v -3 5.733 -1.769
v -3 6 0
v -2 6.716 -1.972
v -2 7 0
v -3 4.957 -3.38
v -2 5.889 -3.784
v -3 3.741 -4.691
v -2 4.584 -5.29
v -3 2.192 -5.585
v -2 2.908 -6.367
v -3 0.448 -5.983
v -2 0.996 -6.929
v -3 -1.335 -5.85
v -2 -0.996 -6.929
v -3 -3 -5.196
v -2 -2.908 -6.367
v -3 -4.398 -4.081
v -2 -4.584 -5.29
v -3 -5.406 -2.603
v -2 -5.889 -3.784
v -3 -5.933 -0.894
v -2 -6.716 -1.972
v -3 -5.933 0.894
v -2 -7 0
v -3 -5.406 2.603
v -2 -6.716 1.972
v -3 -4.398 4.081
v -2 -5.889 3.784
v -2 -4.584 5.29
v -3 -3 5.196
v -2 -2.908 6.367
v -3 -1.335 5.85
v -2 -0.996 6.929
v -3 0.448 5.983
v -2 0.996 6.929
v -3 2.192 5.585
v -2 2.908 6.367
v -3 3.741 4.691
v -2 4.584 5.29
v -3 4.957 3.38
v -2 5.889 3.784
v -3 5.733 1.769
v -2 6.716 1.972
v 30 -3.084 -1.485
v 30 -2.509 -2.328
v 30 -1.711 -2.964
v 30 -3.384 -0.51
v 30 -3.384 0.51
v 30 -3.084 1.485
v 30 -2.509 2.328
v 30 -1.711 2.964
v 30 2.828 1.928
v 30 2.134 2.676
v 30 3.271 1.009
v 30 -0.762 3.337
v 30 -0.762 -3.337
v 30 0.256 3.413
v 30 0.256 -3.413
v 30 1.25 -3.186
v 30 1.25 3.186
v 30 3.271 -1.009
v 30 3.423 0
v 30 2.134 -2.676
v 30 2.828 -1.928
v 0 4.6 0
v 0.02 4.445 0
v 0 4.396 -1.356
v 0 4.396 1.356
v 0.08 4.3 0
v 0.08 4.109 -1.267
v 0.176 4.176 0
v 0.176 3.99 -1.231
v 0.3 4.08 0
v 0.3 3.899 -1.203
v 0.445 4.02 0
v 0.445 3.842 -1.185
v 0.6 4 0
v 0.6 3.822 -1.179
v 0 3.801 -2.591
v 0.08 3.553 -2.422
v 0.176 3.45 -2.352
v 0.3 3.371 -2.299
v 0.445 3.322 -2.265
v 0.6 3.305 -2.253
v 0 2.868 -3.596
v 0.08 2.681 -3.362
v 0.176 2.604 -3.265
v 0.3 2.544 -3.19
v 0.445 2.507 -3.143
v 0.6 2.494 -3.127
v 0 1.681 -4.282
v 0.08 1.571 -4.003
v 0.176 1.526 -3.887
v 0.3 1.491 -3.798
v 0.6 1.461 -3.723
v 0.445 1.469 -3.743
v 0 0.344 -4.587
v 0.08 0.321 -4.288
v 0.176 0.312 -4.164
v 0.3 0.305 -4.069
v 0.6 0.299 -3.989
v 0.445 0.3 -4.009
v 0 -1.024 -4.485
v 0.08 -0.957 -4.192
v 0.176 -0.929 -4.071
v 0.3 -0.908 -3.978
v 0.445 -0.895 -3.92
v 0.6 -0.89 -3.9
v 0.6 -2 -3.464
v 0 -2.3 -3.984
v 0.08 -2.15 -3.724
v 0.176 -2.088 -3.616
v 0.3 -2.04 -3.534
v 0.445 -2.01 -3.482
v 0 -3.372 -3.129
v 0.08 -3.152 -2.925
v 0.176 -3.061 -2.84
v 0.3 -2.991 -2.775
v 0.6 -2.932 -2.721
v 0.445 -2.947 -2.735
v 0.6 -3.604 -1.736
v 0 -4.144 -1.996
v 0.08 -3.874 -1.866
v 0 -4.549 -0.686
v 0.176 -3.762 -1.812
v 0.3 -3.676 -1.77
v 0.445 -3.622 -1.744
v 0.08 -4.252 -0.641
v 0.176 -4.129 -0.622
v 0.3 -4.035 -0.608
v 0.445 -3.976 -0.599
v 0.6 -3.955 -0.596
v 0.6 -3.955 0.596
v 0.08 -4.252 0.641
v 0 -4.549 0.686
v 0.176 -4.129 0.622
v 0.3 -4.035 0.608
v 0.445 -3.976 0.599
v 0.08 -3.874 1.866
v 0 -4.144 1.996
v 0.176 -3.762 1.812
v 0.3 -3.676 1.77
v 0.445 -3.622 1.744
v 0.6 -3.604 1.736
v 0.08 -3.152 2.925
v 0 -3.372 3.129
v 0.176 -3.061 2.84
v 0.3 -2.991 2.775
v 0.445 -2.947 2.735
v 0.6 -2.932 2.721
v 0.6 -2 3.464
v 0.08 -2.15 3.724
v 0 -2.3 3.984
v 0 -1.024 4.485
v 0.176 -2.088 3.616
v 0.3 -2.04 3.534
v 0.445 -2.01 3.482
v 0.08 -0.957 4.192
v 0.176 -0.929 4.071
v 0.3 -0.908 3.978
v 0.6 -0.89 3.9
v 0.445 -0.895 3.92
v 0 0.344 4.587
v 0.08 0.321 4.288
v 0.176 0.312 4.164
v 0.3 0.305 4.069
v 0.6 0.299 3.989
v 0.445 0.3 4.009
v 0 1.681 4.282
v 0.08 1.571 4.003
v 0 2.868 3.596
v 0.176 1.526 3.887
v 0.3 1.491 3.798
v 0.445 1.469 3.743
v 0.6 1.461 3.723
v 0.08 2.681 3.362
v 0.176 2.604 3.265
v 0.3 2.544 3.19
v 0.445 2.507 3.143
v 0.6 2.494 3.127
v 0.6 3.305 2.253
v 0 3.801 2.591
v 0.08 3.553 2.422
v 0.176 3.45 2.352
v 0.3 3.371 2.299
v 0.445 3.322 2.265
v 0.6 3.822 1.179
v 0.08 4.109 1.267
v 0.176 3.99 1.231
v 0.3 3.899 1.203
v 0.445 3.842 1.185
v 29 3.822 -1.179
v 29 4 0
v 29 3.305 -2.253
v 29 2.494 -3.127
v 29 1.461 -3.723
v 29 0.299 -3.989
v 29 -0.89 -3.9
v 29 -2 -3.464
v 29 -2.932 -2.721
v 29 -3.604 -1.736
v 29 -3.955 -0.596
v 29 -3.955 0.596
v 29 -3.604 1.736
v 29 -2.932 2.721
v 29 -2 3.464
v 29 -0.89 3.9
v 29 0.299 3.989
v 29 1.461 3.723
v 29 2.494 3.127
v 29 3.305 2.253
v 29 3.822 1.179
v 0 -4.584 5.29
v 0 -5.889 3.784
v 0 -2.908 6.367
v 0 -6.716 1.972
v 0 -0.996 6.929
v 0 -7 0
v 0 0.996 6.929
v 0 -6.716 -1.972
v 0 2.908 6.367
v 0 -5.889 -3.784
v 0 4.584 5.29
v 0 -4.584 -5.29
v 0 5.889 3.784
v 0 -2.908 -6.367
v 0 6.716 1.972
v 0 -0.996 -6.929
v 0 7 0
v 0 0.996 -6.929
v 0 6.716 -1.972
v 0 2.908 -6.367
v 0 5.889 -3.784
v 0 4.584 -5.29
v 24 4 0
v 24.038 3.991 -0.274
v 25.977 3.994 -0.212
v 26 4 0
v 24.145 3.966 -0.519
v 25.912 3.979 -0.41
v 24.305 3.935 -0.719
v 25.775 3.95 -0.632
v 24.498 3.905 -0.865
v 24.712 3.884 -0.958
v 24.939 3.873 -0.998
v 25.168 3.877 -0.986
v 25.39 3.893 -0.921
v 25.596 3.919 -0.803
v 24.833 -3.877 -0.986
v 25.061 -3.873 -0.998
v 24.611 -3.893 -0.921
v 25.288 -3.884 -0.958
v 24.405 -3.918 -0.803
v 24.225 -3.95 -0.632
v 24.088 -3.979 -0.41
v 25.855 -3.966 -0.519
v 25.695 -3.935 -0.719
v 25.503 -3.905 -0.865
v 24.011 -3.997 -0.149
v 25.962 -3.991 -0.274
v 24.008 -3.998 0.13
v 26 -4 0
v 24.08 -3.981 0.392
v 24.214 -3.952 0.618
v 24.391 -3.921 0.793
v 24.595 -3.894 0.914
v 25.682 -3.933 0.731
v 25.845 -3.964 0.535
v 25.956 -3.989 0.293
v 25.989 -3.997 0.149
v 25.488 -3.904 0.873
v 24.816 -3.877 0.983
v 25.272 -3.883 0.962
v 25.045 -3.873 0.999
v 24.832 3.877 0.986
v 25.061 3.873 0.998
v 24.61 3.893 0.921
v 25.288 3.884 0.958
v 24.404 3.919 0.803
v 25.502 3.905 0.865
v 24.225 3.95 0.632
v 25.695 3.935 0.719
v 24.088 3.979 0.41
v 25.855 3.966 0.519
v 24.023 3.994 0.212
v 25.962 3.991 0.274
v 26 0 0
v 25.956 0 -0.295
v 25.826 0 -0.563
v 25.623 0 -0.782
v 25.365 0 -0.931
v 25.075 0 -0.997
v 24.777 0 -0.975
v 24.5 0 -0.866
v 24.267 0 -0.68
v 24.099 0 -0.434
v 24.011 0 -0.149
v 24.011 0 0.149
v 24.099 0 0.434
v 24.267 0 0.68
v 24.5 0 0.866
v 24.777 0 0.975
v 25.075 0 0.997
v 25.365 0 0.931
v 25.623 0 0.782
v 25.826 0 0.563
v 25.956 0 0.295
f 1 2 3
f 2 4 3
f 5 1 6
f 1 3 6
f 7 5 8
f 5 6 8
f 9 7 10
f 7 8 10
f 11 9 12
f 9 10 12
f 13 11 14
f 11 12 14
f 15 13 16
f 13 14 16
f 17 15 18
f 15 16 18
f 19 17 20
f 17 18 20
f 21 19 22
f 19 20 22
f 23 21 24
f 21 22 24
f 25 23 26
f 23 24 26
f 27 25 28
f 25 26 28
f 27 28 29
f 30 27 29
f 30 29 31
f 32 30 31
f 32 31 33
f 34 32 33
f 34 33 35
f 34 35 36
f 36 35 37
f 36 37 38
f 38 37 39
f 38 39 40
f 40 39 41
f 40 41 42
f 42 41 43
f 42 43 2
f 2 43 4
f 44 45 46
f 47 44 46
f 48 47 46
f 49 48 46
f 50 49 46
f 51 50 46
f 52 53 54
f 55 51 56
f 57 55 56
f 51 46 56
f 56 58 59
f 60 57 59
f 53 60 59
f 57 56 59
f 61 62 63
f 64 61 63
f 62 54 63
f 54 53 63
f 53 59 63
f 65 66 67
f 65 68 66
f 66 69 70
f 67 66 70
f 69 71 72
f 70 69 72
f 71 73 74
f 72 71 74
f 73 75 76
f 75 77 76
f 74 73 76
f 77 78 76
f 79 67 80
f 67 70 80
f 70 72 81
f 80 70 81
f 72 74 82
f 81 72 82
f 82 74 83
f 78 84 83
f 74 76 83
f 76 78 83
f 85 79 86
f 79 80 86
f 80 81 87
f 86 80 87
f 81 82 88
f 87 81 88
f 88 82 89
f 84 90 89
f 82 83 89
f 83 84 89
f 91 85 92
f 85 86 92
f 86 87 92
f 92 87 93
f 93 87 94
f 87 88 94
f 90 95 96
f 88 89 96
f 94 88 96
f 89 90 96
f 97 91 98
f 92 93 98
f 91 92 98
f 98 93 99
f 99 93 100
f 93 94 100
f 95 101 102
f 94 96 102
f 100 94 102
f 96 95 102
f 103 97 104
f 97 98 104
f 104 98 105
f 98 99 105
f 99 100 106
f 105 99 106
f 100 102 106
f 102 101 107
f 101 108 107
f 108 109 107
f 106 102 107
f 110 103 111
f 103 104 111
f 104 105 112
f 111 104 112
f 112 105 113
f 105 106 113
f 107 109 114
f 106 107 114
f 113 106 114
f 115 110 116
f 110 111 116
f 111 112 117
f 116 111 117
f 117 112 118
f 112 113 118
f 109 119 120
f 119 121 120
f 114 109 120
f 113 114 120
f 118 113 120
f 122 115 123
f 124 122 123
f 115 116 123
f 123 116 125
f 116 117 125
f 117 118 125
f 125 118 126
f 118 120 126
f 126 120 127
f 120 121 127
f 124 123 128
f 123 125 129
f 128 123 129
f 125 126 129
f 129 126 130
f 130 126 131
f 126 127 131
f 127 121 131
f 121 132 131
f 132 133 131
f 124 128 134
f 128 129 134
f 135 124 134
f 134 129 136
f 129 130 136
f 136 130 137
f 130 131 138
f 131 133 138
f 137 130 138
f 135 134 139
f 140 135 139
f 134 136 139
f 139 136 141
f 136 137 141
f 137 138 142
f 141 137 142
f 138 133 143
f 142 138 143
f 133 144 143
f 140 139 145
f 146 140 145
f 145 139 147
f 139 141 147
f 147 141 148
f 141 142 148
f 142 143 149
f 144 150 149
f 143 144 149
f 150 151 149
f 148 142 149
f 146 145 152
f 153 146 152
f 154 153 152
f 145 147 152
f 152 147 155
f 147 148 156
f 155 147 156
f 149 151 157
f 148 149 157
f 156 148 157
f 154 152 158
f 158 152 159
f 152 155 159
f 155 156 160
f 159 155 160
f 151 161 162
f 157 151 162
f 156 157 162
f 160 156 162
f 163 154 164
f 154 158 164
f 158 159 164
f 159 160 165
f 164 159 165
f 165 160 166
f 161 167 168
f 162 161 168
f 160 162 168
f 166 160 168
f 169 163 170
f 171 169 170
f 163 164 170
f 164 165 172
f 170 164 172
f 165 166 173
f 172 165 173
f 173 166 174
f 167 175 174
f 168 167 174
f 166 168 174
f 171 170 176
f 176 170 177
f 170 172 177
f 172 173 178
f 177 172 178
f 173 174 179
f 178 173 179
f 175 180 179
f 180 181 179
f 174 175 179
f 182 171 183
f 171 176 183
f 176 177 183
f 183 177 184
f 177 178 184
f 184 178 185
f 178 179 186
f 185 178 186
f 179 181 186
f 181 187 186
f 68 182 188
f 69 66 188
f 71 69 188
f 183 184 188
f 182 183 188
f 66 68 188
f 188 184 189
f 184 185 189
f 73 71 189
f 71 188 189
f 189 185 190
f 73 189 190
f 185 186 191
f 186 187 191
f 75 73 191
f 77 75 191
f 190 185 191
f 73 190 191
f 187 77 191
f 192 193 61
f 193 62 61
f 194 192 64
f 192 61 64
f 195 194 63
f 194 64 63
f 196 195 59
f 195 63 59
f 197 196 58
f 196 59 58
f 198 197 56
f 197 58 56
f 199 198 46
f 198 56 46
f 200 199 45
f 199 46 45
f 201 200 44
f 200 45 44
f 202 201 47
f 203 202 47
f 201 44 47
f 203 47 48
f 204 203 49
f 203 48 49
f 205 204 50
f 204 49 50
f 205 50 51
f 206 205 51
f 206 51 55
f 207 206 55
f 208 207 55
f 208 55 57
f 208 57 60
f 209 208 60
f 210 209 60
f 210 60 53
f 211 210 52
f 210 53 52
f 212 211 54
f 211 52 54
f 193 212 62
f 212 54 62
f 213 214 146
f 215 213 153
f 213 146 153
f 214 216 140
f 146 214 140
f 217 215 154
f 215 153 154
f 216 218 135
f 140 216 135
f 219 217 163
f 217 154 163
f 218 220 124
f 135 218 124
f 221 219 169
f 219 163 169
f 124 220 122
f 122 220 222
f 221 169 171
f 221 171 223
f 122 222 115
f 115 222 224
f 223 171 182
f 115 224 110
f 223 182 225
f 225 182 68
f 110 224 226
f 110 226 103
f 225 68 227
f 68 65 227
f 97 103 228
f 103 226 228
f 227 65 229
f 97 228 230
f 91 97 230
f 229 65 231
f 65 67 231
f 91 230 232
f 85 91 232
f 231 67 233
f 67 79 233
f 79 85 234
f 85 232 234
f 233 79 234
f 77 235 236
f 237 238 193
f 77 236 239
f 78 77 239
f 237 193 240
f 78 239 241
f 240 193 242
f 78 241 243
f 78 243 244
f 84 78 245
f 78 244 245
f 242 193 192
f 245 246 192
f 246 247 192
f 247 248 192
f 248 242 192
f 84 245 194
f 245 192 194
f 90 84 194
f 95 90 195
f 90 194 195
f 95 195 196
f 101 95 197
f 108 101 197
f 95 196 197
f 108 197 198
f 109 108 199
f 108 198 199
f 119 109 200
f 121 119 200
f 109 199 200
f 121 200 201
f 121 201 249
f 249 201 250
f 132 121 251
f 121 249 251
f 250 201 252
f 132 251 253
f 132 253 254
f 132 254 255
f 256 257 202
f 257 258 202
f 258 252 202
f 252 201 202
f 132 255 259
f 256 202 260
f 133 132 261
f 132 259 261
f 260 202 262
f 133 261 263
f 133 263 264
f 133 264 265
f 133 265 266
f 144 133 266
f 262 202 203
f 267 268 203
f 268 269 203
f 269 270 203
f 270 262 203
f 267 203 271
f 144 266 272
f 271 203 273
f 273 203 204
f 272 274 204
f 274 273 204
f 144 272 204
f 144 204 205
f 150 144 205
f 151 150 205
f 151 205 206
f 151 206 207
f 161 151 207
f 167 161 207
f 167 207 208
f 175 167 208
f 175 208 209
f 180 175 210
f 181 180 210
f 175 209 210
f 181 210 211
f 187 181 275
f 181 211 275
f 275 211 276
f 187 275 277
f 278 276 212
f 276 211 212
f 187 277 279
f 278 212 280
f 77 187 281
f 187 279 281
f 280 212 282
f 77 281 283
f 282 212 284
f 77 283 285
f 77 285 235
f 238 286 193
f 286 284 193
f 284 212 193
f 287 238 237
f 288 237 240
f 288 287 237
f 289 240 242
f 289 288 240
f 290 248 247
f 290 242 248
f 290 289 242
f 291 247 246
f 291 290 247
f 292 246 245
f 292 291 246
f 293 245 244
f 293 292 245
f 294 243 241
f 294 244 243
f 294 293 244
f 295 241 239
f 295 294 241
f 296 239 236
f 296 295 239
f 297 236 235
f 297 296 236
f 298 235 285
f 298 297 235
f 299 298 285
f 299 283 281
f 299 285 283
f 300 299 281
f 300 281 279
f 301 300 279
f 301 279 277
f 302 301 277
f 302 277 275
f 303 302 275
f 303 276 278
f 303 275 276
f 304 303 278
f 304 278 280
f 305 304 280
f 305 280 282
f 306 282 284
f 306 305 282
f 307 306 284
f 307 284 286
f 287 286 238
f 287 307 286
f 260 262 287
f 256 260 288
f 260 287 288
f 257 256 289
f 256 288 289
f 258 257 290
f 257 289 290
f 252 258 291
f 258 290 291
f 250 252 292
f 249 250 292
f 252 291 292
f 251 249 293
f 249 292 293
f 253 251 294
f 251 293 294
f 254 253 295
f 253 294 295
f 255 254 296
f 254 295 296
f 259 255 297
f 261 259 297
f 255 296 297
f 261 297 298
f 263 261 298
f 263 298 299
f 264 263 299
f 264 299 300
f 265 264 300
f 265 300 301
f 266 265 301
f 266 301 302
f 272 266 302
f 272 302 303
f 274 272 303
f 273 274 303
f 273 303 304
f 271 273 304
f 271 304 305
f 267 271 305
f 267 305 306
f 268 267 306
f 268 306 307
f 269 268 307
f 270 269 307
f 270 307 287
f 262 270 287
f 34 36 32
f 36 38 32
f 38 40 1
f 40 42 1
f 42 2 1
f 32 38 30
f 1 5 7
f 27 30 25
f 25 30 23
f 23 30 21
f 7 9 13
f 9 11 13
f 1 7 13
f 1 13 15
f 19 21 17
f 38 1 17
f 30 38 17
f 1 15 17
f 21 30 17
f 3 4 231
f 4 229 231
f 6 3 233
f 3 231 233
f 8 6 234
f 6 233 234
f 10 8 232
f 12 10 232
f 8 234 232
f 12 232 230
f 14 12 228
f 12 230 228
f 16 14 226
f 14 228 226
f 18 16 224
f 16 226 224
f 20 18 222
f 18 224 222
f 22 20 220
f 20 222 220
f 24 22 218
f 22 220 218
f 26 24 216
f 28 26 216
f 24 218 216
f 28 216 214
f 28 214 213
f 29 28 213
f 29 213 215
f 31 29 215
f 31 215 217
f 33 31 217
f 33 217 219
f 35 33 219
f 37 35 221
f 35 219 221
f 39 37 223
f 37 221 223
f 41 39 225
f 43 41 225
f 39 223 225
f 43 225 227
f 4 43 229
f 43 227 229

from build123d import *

# Parameters (mm, degrees)
VERRUNDUNG1_R                               = 0.6
SCHNITT_LINEAR_AUSTRAGEN1_REACH             = 9
SKIZZE2_R                                   = 1
SCHNITT_LINEAR_AUSTRAGEN1_DIRECTION_2_REACH = 9


with BuildPart() as part:
    # Skizze1 → Rotation1 (revolve)
    with BuildSketch(Plane.XY):
        Polygon((-3, 0), (-3, 6), (-2, 7), (0, 7), (0, 4), (29, 4), (30, 3.422649731), (30, 0), align=None)
    revolve(axis=Axis((30, 0, 0), (-1, 0, 0)))

    # Verrundung1
    verrundung1_edges = [part.edges().sort_by_distance(p)[0] for p in [
        (0, -4, 0),
    ]]
    fillet(verrundung1_edges, radius=VERRUNDUNG1_R)

    # Skizze2 → Schnitt-Linear austragen1 (cut, up to next)
    with BuildSketch(Plane(origin=(0, 0, 0), x_dir=(1, 0, 0), z_dir=(0, 1, 0)), mode=Mode.PRIVATE) as schnitt_linear_austragen1_sk1:
        with Locations((25, 0)):
            Circle(SKIZZE2_R)
    schnitt_linear_austragen1_tool1 = extrude(schnitt_linear_austragen1_sk1.sketch, amount=-SCHNITT_LINEAR_AUSTRAGEN1_REACH, mode=Mode.PRIVATE) & part.part
    add(schnitt_linear_austragen1_tool1.solids().sort_by_distance((25, 0, 0))[0], mode=Mode.SUBTRACT)

    # Skizze2 → Schnitt-Linear austragen1 direction 2 (cut, up to next)
    with BuildSketch(Plane(origin=(0, 0, 0), x_dir=(1, 0, 0), z_dir=(0, 1, 0)), mode=Mode.PRIVATE) as schnitt_linear_austragen1_direction_2_sk1:
        with Locations((25, 0)):
            Circle(SKIZZE2_R)
    schnitt_linear_austragen1_direction_2_tool1 = extrude(schnitt_linear_austragen1_direction_2_sk1.sketch, amount=SCHNITT_LINEAR_AUSTRAGEN1_DIRECTION_2_REACH, mode=Mode.PRIVATE) & part.part
    add(schnitt_linear_austragen1_direction_2_tool1.solids().sort_by_distance((25, 0, 0))[0], mode=Mode.SUBTRACT)


solid = part.part
